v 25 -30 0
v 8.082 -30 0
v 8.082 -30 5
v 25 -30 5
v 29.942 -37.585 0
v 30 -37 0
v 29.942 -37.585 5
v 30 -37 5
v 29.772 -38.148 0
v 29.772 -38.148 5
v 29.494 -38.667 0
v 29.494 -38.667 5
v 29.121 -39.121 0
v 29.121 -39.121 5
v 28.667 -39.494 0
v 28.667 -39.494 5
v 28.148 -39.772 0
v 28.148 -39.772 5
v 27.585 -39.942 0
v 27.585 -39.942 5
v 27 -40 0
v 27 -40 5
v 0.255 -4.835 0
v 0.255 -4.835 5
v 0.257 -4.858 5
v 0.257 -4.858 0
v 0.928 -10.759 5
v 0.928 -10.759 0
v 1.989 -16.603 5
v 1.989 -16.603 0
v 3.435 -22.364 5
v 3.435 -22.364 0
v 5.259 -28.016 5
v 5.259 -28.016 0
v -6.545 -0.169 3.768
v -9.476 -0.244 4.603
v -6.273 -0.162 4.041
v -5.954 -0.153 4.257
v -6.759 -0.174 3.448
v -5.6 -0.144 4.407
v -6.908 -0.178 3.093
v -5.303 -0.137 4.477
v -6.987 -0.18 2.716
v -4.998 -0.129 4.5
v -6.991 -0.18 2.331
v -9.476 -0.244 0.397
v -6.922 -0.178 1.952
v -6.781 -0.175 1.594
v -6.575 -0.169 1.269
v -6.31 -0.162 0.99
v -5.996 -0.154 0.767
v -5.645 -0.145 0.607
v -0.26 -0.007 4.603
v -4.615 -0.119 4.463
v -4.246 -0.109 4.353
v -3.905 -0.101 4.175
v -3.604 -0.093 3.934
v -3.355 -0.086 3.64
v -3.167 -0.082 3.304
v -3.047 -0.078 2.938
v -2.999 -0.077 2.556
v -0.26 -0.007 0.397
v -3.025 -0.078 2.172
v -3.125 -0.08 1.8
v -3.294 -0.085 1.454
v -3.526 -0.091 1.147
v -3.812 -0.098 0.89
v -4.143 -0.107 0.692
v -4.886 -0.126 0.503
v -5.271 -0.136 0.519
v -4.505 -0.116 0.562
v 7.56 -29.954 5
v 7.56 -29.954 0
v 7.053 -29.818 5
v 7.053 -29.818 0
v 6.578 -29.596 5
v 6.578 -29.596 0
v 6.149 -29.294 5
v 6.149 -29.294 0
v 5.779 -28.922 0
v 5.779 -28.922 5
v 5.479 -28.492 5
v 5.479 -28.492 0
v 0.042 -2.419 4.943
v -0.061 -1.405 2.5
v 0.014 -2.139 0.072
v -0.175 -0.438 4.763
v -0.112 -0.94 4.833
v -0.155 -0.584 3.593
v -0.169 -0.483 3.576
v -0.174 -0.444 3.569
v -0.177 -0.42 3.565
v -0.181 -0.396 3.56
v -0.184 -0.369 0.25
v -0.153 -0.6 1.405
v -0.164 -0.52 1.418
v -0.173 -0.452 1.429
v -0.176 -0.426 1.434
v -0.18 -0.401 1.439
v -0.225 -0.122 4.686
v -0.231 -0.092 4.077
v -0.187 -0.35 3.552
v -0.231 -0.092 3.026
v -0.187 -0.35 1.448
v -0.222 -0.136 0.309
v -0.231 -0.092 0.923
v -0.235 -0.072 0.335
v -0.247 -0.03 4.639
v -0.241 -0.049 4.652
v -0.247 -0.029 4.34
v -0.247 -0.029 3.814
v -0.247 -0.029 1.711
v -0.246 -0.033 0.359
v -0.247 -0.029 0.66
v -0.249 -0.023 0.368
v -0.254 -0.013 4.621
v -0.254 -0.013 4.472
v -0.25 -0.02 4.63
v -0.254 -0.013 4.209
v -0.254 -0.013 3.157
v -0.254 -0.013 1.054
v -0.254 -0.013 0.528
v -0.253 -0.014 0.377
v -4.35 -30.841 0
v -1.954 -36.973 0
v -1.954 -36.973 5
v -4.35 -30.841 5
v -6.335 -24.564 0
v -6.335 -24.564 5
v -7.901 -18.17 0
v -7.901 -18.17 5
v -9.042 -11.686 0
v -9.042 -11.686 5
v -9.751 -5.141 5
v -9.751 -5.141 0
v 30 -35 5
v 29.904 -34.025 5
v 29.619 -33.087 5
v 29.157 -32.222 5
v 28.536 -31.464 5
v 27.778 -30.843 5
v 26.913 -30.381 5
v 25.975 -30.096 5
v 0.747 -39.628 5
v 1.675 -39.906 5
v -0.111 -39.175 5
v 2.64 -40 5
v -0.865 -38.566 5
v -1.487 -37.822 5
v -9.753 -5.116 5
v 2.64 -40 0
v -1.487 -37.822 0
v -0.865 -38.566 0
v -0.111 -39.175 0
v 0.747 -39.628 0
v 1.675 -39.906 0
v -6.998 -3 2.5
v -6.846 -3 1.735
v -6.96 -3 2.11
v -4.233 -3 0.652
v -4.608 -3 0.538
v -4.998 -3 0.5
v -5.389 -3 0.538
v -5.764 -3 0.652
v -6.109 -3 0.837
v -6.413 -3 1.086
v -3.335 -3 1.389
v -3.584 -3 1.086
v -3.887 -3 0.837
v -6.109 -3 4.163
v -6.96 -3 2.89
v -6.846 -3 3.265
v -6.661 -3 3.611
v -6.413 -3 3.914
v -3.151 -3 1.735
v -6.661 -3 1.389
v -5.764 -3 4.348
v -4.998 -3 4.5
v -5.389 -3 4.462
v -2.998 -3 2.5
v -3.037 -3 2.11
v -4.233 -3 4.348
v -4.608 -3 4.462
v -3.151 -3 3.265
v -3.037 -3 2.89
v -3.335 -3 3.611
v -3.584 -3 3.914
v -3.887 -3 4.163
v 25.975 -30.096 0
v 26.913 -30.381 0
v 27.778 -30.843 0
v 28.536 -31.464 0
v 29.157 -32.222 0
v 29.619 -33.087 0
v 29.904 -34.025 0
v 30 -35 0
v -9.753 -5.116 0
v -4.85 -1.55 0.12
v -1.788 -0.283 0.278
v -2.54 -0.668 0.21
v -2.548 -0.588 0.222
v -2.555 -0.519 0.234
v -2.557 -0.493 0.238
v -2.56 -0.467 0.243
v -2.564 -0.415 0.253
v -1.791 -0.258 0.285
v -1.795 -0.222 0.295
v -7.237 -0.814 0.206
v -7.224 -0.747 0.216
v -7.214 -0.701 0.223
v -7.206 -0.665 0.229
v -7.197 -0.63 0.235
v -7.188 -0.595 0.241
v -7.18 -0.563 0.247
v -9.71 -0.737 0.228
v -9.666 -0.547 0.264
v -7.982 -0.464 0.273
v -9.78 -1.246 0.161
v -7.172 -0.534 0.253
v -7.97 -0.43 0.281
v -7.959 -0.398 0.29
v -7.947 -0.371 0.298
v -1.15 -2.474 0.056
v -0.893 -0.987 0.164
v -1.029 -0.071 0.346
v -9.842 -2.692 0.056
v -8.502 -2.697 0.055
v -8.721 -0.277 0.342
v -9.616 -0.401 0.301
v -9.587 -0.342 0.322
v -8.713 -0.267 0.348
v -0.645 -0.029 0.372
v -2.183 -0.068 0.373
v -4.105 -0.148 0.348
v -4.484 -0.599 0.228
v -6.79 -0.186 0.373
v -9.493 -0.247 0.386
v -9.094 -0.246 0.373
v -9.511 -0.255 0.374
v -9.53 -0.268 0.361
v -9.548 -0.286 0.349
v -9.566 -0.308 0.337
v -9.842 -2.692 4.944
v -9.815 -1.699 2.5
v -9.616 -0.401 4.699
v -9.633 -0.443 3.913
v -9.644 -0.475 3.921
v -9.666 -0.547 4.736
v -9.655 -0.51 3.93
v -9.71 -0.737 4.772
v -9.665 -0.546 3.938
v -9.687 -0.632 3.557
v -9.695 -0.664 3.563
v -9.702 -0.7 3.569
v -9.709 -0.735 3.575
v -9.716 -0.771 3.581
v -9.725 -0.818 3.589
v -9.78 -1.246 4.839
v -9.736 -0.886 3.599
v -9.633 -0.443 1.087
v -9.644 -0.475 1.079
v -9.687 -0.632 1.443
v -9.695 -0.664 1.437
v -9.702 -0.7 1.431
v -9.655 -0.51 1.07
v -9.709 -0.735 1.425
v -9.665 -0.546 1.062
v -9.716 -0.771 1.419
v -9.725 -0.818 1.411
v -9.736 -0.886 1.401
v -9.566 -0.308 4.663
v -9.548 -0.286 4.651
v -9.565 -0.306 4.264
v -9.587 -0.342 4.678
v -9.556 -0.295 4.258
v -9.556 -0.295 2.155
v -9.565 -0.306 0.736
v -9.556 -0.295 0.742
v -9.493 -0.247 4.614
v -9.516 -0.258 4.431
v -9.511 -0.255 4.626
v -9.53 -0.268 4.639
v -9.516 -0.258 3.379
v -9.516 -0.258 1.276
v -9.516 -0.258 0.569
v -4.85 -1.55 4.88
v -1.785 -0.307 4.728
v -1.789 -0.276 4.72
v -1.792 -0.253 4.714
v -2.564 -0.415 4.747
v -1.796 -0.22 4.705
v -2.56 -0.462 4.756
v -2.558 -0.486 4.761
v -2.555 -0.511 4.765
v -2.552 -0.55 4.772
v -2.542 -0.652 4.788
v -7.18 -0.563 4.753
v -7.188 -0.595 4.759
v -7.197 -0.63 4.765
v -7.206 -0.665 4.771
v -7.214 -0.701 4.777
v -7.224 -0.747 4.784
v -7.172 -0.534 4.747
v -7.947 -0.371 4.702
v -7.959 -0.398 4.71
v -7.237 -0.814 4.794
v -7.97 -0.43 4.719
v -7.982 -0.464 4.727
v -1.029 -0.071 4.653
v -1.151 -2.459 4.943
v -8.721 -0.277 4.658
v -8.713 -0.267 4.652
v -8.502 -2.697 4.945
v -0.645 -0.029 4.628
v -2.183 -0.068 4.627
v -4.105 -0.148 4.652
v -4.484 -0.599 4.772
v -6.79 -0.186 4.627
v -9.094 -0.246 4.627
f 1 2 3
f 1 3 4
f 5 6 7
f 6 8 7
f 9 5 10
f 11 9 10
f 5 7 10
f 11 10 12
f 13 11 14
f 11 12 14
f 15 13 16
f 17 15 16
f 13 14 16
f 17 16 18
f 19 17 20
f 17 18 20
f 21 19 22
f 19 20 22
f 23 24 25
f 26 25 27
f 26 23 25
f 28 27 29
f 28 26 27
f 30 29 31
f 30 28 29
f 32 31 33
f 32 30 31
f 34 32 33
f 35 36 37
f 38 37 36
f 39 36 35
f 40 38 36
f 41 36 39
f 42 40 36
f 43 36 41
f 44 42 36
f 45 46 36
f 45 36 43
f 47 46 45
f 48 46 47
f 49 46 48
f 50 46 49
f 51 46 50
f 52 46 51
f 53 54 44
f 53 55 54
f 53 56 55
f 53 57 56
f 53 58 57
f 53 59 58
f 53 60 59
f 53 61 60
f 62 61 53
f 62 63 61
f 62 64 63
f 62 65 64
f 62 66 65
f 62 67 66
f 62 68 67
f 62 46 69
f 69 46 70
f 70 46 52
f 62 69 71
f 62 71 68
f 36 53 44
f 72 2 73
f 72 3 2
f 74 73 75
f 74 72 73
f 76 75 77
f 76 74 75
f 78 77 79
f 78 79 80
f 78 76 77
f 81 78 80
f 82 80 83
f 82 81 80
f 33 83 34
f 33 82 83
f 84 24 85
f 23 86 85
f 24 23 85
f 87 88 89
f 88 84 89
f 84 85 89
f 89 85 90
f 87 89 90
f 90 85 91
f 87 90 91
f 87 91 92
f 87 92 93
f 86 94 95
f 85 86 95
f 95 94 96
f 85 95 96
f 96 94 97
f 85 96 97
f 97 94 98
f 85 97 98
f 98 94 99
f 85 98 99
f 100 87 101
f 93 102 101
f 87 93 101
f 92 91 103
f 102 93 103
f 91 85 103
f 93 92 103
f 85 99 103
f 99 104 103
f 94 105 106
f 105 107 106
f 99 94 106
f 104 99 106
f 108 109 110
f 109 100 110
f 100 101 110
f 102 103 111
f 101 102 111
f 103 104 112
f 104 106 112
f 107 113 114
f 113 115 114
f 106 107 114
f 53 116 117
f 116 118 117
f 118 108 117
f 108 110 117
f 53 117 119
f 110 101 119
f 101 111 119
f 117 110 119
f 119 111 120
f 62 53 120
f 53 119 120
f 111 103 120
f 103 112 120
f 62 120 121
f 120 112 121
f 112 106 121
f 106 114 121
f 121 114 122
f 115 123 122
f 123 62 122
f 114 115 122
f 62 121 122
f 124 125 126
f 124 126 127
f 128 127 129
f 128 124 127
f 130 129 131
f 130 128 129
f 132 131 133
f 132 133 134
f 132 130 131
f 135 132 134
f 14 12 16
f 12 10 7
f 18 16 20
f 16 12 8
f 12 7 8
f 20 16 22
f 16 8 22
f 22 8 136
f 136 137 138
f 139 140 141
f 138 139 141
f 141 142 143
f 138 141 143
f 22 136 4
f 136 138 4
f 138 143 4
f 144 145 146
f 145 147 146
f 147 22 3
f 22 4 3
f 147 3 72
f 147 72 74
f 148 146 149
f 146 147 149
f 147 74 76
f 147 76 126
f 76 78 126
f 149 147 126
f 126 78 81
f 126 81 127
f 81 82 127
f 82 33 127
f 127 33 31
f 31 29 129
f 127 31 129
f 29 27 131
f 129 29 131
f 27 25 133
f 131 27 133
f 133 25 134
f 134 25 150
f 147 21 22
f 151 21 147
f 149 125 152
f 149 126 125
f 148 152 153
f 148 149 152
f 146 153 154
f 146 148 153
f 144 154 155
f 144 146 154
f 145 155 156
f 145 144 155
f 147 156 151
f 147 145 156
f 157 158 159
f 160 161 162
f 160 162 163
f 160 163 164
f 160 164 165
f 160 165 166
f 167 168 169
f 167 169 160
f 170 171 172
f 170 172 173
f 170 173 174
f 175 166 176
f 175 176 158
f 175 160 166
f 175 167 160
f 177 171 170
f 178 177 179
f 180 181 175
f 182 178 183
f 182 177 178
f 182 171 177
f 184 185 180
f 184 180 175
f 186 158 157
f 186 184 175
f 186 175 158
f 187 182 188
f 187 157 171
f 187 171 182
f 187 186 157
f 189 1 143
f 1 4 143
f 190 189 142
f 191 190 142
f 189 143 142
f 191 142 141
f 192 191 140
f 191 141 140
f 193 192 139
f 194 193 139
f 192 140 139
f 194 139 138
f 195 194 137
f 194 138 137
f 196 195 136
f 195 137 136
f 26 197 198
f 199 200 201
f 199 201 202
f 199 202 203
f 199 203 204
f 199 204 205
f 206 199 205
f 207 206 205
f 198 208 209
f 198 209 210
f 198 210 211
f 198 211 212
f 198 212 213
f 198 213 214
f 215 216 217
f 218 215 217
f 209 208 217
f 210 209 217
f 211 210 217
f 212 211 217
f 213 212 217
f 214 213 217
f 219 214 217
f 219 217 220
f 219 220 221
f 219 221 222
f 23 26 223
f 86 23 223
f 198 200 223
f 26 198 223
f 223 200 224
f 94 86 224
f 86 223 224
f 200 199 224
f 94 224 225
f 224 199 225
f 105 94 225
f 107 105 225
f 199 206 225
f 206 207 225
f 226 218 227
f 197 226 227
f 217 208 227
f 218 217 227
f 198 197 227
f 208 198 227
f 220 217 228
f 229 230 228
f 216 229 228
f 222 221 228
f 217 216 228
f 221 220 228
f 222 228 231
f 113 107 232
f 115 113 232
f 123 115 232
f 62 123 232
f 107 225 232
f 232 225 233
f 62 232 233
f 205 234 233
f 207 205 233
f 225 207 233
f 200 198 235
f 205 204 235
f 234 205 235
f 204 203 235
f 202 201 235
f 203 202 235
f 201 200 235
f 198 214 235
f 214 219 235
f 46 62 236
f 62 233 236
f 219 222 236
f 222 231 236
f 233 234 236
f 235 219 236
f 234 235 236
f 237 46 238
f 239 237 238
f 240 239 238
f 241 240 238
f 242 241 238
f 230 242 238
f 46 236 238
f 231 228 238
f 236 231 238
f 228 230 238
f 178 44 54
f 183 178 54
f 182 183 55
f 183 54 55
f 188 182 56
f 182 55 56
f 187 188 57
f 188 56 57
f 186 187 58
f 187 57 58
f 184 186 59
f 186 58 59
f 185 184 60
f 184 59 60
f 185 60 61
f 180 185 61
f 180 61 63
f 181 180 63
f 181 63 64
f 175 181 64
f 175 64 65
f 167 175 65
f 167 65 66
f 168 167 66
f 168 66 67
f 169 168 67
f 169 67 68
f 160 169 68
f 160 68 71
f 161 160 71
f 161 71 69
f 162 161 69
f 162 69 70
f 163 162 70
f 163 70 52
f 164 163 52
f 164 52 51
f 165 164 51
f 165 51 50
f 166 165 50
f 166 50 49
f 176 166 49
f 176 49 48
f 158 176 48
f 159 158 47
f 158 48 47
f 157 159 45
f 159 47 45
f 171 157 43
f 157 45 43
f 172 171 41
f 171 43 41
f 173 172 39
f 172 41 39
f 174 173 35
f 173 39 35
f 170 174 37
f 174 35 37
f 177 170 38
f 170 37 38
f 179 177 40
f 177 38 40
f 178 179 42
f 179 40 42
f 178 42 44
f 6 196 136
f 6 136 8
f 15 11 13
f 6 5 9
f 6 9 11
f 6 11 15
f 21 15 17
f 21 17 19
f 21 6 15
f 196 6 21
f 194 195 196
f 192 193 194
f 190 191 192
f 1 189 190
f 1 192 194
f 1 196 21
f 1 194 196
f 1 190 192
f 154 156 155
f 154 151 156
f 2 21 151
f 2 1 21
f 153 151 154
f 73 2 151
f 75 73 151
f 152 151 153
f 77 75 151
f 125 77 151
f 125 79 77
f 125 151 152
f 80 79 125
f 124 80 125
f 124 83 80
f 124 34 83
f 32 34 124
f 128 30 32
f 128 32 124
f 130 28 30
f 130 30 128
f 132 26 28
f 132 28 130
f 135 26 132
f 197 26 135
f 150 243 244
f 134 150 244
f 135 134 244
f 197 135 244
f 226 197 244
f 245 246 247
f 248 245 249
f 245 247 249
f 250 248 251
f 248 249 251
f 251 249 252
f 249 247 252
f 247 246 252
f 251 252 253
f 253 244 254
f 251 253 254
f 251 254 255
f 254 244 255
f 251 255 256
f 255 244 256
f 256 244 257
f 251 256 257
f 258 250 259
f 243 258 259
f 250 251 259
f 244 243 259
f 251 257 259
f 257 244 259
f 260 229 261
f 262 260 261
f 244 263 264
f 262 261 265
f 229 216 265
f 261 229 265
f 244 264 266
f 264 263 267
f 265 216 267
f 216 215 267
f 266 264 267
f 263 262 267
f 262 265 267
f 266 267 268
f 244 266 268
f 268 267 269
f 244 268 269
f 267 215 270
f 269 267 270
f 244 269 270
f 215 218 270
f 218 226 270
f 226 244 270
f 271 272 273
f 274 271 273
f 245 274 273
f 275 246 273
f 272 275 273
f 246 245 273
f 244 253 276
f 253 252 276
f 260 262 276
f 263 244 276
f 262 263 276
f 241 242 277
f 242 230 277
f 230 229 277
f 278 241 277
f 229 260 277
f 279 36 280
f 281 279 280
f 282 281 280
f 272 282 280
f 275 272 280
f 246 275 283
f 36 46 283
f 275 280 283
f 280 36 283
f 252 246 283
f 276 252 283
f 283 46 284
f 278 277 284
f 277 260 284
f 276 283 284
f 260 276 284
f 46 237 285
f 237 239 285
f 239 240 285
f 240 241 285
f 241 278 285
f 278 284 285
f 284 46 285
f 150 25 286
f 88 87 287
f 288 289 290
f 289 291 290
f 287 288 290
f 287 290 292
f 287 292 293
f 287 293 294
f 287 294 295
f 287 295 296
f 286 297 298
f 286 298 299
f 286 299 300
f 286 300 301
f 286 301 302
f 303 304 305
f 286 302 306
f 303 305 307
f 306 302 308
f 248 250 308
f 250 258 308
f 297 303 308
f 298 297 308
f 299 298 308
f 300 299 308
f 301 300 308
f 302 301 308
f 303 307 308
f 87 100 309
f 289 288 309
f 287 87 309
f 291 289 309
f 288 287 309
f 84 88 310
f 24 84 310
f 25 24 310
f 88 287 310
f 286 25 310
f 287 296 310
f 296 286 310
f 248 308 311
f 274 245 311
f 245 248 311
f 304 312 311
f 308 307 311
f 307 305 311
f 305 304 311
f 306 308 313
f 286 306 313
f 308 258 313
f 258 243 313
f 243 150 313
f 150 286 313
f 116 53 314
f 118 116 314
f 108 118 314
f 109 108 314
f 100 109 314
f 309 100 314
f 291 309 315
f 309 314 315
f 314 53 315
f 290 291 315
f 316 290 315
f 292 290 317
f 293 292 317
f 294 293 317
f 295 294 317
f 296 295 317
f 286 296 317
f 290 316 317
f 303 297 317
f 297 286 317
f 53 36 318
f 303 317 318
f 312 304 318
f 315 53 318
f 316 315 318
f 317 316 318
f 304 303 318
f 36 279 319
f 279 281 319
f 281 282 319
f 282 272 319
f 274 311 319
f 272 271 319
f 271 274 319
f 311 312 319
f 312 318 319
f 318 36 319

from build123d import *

# Parameters (mm, degrees)
EXTRUDE_THIN1_DEPTH = 5
SKETCH2_R           = 2
CUT_EXTRUDE1_DEPTH  = 3
FILLET1_R           = 5
FILLET2_R           = 3
FILLET3_R           = 3
FILLET5_R           = 5


with BuildPart() as part:
    # Sketch1 → Extrude-Thin1 (new body)
    with BuildSketch(Plane.XY):
        with BuildLine():
            ThreePointArc((0, 0), (1.709468812, -15.258106238), (6, -30))
            Line((6, -30), (30, -30))
            Line((30, -30), (30, -40))
            Line((30, -40), (-0.59396654, -40))
            ThreePointArc((-0.59396654, -40), (-7.355075067, -20.616040357), (-9.996685535, -0.257445757))
            Line((-9.996685535, -0.257445757), (0, 0))
        make_face()
    extrude(amount=EXTRUDE_THIN1_DEPTH)

    # Sketch2 → Cut-Extrude1 (cut)
    with BuildSketch(Plane(origin=(0, 0, 0), x_dir=(1, 0, 0), z_dir=(0, 1, 0))):
        with Locations(Location((-4.998342767, -2.5, 0), (0, 0, 270))):
            Circle(SKETCH2_R)
    extrude(amount=-CUT_EXTRUDE1_DEPTH, mode=Mode.SUBTRACT)

    # Fillet1
    fillet1_edges = [part.edges().sort_by_distance(p)[0] for p in [
        (30, -30, 2.5),
    ]]
    fillet(fillet1_edges, radius=FILLET1_R)

    # Fillet2
    fillet2_edges = [part.edges().sort_by_distance(p)[0] for p in [
        (30, -40, 2.5),
    ]]
    fillet(fillet2_edges, radius=FILLET2_R)

    # Fillet3
    fillet3_edges = [part.edges().sort_by_distance(p)[0] for p in [
        (6, -30, 2.5),
    ]]
    fillet(fillet3_edges, radius=FILLET3_R)

    # Fillet4
    # a fillet whose section is not a circle: 5, 0.4 mm, written as the material it takes off along each edge (its section moved 0.00015 mm through the faces so that the kernel can cut it)
    with BuildSketch(Plane(origin=(-22.492542459, -0.579252954, 0), x_dir=(0.02574457573397758, -0.9996685530315923, -2.999999998649999e-05), z_dir=(0.9996685534814432, 0.025744575745562638, 0))) as fillet4_piece_1:
        with BuildLine():
            Bezier((5.000000002, 0), (-0.000149995, 0.000150004), (-0.000162, -0.399999995), weights=[1, 0.707106781, 1])
            Line((-0.000162, -0.399999995), (-0.100162, -0.399996995))
            ThreePointArc((-0.100162, -0.399996995), (-0.100006, -0.199997), (-0.1, 3e-06))
            Line((-0.1, 3e-06), (3e-06, 0.1))
            ThreePointArc((3e-06, 0.1), (2.500002999, 0.099925), (5.000003002, 0.1))
            Line((5.000003002, 0.1), (5.000000002, 0))
        make_face()
    extrude(amount=35.000000011, mode=Mode.SUBTRACT)
    with BuildSketch(Plane(origin=(-9.996685535, -0.257445757, -12.554427483), x_dir=(0.9996611732267645, 0.026029574389313356, 0), z_dir=(0, 0, 1))) as fillet4_piece_2:
        with BuildLine():
            Bezier((0.526141916, 0), (-0.126969786, 0.000186198), (0.12506971, -5.02021329), weights=[1, 0.689048379, 1])
            Line((0.12506971, -5.02021329), (0.02519549, -5.025227283))
            ThreePointArc((0.02519549, -5.025227283), (-0.069016975, -2.513387959), (-0.099999996, 2.8509e-05))
            Line((-0.099999996, 2.8509e-05), (2.8509e-05, 0.099999996))
            ThreePointArc((2.8509e-05, 0.099999996), (0.263099446, 0.099924996), (0.526170426, 0.099999996))
            Line((0.526170426, 0.099999996), (0.526141916, 0))
        make_face()
    extrude(amount=30.108854967, mode=Mode.SUBTRACT)
    with BuildSketch(Plane(origin=(-22.492542459, -0.579252954, 5), x_dir=(-9.654215225776052e-06, 0.00037487568119717526, -0.9999999296875075), z_dir=(0.9996685534814432, 0.025744575745562638, 0))) as fillet4_piece_3:
        with BuildLine():
            Bezier((0.400000028, 0), (-0.000149944, 0.000150056), (-0.002025, -4.999999592), weights=[1, 0.707106781, 1])
            Line((-0.002025, -4.999999592), (-0.102024993, -4.999962092))
            ThreePointArc((-0.102024993, -4.999962092), (-0.100937493, -2.499962324), (-0.099999993, 3.75e-05))
            Line((-0.099999993, 3.75e-05), (3.75e-05, 0.099999993))
            ThreePointArc((3.75e-05, 0.099999993), (0.200037486, 0.099924993), (0.400037528, 0.099999993))
            Line((0.400037528, 0.099999993), (0.400000028, 0))
        make_face()
    extrude(amount=35.000000011, mode=Mode.SUBTRACT)
    with BuildSketch(Plane(origin=(0, 0, -12.449220075), x_dir=(0.05355702462204362, -0.9985647926467435, 0), z_dir=(0, 0, 1))) as fillet4_piece_4:
        with BuildLine():
            Bezier((4.97968803, 0), (-0.004005059, -0.138457778), (-0.00741229, -0.260833255), weights=[1, 0.72649212, 1])
            Line((-0.00741229, -0.260833255), (-0.107373553, -0.25805009))
            ThreePointArc((-0.107373553, -0.25805009), (-0.103592437, -0.12763555), (-0.099961262, 0.002783165))
            Line((-0.099961262, 0.002783165), (0.002783165, 0.099961262))
            ThreePointArc((0.002783165, 0.099961262), (2.489845983, 0.065307551), (4.976910885, 0.09996143))
            Line((4.976910885, 0.09996143), (4.97968803, 0))
        make_face()
    extrude(amount=29.898440151, mode=Mode.SUBTRACT)

    # Fillet5
    fillet5_edges = [part.edges().sort_by_distance(p)[0] for p in [
        (-0.59396654, -40, 2.5),
    ]]
    fillet(fillet5_edges, radius=FILLET5_R)


solid = part.part
